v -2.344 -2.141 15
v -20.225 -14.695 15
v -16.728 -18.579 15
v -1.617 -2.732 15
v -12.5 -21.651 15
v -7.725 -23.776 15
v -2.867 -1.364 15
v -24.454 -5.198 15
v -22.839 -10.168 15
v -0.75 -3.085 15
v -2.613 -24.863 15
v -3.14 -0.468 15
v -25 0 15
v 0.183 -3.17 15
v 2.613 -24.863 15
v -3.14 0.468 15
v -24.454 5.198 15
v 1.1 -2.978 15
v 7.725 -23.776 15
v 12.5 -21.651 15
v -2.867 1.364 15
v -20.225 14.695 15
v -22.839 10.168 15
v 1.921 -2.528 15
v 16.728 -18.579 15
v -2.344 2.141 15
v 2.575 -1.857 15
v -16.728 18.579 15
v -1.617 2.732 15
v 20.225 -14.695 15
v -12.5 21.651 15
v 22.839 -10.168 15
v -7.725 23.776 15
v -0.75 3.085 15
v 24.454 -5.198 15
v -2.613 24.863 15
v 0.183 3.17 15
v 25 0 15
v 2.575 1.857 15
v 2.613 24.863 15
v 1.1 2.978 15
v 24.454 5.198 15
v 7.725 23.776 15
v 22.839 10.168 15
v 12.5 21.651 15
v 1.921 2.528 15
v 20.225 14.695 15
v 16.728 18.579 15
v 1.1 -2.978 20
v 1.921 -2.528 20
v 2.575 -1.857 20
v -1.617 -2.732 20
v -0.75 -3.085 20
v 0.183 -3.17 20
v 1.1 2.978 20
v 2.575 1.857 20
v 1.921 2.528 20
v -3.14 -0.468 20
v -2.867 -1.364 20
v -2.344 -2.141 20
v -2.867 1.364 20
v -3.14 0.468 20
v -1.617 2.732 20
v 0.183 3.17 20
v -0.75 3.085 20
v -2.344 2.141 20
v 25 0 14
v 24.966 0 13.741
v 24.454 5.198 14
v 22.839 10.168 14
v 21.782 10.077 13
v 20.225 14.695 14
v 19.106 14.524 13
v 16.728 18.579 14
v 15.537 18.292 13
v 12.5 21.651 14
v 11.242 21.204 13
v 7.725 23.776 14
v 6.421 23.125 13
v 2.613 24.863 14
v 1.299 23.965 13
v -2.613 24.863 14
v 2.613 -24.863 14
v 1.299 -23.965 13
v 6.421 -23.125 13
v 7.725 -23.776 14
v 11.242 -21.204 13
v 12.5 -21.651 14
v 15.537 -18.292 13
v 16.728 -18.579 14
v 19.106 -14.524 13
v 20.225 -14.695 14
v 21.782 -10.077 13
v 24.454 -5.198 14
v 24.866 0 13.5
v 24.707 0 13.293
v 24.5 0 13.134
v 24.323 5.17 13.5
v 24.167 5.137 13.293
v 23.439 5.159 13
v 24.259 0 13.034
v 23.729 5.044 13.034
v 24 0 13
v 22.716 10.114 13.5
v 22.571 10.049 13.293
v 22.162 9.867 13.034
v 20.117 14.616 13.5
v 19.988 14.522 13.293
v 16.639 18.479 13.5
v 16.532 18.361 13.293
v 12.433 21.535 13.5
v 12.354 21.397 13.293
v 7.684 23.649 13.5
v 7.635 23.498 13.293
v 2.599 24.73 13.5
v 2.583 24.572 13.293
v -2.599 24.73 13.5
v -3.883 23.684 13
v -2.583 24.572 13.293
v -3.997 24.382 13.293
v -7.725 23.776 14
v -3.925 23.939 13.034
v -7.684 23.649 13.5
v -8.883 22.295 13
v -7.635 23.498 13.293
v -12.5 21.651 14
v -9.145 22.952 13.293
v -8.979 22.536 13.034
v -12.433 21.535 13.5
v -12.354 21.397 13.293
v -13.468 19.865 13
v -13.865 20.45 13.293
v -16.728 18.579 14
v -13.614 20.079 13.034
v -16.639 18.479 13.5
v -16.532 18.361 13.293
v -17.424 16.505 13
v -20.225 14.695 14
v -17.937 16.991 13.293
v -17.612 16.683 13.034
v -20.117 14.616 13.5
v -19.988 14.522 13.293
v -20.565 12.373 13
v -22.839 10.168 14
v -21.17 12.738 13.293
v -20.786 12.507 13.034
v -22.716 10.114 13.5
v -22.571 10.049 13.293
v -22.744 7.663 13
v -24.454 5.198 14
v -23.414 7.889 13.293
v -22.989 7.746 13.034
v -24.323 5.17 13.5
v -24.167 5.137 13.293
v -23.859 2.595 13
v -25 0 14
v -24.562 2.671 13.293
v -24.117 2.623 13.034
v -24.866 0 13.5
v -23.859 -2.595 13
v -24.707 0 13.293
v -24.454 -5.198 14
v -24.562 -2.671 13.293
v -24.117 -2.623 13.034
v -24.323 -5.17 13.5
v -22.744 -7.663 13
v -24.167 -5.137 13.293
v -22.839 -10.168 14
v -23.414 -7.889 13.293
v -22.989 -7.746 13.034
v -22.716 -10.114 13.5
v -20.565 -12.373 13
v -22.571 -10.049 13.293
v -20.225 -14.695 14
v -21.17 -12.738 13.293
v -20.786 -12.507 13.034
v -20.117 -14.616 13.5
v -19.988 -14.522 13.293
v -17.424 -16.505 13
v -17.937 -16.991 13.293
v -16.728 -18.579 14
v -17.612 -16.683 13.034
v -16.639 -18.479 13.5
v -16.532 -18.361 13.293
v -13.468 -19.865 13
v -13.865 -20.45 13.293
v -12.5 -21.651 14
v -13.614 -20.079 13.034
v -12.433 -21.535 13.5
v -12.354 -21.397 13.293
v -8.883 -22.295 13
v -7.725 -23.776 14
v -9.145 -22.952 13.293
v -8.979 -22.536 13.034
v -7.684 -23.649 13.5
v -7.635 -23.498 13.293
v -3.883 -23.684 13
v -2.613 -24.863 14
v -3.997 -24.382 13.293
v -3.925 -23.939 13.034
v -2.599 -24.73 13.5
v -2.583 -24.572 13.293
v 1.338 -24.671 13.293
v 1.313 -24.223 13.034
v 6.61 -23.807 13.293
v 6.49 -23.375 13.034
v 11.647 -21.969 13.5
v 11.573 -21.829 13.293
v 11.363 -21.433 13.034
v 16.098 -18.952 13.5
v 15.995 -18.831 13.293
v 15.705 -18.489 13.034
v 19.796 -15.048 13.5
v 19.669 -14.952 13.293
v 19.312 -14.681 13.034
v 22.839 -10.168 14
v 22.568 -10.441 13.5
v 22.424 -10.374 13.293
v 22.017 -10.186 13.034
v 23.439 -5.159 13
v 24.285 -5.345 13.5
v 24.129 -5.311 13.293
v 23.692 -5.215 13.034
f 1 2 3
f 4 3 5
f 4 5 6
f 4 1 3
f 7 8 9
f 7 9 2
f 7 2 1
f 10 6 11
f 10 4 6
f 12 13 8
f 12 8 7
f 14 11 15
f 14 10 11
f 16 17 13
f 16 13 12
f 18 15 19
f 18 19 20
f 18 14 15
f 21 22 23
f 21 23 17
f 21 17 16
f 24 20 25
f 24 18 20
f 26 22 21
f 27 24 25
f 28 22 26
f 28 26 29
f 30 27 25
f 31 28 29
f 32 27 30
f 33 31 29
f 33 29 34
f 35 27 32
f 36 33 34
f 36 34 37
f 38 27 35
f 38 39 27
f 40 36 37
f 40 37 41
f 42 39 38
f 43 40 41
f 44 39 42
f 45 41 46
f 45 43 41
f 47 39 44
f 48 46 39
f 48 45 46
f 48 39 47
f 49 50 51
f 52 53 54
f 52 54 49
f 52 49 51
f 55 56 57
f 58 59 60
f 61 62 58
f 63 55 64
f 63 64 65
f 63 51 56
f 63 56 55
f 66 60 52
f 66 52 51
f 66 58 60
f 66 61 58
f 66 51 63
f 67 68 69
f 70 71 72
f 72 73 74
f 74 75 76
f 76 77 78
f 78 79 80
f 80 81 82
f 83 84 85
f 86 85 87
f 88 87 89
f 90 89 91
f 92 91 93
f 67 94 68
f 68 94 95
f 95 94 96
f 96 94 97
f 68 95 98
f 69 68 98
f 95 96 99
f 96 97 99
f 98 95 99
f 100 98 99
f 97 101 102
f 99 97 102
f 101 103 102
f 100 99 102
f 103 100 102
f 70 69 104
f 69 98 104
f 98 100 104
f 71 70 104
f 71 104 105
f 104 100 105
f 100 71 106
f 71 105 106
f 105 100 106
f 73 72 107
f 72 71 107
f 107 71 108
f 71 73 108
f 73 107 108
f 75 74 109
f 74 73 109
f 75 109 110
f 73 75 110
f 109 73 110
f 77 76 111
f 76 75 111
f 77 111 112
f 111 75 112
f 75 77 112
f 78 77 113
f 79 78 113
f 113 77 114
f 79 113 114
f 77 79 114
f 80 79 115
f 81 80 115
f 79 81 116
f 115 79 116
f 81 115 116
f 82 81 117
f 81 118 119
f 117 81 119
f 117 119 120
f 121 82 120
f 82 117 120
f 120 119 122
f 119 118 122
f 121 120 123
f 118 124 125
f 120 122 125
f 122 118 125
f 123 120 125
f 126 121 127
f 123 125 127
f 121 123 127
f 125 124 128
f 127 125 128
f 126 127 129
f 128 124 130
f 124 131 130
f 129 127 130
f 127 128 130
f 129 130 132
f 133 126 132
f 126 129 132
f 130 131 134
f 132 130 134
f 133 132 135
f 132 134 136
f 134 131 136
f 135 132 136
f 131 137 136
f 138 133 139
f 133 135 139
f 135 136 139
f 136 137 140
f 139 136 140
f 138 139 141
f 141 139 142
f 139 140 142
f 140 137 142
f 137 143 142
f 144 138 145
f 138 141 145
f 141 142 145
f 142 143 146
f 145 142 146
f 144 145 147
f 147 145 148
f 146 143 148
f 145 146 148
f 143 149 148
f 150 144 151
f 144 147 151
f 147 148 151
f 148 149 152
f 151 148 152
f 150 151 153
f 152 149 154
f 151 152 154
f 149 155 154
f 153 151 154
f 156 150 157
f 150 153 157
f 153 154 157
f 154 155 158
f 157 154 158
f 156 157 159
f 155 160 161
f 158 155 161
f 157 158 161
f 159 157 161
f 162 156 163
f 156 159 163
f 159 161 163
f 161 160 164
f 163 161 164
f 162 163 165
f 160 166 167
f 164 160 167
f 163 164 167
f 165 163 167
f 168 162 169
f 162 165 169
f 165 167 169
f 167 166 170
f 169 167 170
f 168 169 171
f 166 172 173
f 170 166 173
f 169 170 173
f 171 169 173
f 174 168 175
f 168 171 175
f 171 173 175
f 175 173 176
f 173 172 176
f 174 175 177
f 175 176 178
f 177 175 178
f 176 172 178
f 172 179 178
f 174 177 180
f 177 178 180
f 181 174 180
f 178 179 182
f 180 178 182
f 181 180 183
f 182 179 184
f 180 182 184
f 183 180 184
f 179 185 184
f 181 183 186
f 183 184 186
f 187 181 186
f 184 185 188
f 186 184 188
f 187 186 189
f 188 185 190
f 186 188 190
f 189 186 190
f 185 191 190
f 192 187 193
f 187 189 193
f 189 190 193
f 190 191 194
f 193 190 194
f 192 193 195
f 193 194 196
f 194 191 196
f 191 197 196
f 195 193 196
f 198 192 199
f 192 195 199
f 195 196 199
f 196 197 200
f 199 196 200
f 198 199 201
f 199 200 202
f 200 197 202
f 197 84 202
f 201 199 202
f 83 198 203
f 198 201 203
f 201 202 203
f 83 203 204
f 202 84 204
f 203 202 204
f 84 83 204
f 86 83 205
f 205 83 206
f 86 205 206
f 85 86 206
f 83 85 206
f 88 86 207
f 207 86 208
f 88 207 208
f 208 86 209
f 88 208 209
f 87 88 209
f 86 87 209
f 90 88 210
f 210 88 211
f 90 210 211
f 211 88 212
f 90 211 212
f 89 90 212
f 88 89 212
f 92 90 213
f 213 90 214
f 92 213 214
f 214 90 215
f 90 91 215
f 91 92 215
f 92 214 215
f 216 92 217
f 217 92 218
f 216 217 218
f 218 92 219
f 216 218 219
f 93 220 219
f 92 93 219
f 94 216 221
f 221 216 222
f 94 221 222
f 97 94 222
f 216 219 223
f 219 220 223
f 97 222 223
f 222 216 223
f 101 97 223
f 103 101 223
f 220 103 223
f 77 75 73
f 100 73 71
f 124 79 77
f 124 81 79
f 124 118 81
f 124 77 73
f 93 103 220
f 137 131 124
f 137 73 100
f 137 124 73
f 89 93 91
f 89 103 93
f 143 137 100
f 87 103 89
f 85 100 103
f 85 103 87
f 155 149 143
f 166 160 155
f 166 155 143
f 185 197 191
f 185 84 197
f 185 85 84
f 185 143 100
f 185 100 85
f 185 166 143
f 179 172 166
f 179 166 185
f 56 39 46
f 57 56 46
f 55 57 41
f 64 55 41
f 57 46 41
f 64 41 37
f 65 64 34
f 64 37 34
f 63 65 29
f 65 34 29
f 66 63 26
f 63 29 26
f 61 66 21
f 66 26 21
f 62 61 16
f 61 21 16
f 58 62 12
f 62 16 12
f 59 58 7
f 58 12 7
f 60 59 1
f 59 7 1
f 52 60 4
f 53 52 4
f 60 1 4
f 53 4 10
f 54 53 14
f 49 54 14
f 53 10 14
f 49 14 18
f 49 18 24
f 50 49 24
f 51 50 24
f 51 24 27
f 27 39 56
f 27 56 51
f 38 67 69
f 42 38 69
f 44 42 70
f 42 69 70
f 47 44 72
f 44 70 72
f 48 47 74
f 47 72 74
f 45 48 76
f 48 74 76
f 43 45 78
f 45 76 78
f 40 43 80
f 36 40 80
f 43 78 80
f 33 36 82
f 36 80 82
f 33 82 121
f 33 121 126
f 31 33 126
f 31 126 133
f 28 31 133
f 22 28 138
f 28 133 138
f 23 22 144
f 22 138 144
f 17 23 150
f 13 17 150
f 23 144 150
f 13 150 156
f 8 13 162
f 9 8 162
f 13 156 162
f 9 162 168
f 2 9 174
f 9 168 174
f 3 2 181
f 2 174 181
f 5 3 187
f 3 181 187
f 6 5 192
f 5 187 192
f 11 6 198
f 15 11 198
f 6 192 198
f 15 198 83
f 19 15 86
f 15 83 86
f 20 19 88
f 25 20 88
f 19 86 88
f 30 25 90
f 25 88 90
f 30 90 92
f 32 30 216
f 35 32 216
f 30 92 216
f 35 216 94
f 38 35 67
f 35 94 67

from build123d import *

# Parameters (mm, degrees)
SKETCH_R        = 25
PAD_DEPTH       = 15
PAD001_DEPTH    = 10
PAD001_FACE2_R  = 25
POCKET_DEPTH    = 13
POCKET001_DEPTH = 5
FILLET_R        = 1


with BuildPart() as part:
    # Sketch → Pad (new body)
    with BuildSketch(Plane.XY):
        Circle(SKETCH_R)
    extrude(amount=PAD_DEPTH)

    # Sketch001 (on Face3 of Pad) → Pad001 (join)
    with BuildSketch(Plane.XY.offset(15)):
        with BuildLine():
            ThreePointArc((2.575, 1.857418), (-3.175, 0), (2.575, -1.857418))
            Line((2.575, 1.857418), (2.575, -1.857418))
        make_face()
    extrude(amount=PAD001_DEPTH)

    # Pad001 Face2 → Pocket (cut)
    with BuildSketch(Plane(origin=(0, 0, 0), x_dir=(0, -1, 0), z_dir=(0, 0, -1))):
        Circle(PAD001_FACE2_R)
    extrude(amount=-POCKET_DEPTH, mode=Mode.SUBTRACT)

    # Pocket Face6 → Pocket001 (cut)
    with BuildSketch(Plane(origin=(-0.141681, 0, 25), x_dir=(0, 1, 0), z_dir=(0, 0, 1))):
        with BuildLine():
            ThreePointArc((1.857418, -2.716681), (0, 3.033319), (-1.857418, -2.716681))
            Line((-1.857418, -2.716681), (1.857418, -2.716681))
        make_face()
    extrude(amount=-POCKET001_DEPTH, mode=Mode.SUBTRACT)

    # Fillet
    fillet_edges = [part.edges().sort_by_distance(p)[0] for p in [
        (-25, 0, 13),
    ]]
    fillet(fillet_edges, radius=FILLET_R)


solid = part.part
